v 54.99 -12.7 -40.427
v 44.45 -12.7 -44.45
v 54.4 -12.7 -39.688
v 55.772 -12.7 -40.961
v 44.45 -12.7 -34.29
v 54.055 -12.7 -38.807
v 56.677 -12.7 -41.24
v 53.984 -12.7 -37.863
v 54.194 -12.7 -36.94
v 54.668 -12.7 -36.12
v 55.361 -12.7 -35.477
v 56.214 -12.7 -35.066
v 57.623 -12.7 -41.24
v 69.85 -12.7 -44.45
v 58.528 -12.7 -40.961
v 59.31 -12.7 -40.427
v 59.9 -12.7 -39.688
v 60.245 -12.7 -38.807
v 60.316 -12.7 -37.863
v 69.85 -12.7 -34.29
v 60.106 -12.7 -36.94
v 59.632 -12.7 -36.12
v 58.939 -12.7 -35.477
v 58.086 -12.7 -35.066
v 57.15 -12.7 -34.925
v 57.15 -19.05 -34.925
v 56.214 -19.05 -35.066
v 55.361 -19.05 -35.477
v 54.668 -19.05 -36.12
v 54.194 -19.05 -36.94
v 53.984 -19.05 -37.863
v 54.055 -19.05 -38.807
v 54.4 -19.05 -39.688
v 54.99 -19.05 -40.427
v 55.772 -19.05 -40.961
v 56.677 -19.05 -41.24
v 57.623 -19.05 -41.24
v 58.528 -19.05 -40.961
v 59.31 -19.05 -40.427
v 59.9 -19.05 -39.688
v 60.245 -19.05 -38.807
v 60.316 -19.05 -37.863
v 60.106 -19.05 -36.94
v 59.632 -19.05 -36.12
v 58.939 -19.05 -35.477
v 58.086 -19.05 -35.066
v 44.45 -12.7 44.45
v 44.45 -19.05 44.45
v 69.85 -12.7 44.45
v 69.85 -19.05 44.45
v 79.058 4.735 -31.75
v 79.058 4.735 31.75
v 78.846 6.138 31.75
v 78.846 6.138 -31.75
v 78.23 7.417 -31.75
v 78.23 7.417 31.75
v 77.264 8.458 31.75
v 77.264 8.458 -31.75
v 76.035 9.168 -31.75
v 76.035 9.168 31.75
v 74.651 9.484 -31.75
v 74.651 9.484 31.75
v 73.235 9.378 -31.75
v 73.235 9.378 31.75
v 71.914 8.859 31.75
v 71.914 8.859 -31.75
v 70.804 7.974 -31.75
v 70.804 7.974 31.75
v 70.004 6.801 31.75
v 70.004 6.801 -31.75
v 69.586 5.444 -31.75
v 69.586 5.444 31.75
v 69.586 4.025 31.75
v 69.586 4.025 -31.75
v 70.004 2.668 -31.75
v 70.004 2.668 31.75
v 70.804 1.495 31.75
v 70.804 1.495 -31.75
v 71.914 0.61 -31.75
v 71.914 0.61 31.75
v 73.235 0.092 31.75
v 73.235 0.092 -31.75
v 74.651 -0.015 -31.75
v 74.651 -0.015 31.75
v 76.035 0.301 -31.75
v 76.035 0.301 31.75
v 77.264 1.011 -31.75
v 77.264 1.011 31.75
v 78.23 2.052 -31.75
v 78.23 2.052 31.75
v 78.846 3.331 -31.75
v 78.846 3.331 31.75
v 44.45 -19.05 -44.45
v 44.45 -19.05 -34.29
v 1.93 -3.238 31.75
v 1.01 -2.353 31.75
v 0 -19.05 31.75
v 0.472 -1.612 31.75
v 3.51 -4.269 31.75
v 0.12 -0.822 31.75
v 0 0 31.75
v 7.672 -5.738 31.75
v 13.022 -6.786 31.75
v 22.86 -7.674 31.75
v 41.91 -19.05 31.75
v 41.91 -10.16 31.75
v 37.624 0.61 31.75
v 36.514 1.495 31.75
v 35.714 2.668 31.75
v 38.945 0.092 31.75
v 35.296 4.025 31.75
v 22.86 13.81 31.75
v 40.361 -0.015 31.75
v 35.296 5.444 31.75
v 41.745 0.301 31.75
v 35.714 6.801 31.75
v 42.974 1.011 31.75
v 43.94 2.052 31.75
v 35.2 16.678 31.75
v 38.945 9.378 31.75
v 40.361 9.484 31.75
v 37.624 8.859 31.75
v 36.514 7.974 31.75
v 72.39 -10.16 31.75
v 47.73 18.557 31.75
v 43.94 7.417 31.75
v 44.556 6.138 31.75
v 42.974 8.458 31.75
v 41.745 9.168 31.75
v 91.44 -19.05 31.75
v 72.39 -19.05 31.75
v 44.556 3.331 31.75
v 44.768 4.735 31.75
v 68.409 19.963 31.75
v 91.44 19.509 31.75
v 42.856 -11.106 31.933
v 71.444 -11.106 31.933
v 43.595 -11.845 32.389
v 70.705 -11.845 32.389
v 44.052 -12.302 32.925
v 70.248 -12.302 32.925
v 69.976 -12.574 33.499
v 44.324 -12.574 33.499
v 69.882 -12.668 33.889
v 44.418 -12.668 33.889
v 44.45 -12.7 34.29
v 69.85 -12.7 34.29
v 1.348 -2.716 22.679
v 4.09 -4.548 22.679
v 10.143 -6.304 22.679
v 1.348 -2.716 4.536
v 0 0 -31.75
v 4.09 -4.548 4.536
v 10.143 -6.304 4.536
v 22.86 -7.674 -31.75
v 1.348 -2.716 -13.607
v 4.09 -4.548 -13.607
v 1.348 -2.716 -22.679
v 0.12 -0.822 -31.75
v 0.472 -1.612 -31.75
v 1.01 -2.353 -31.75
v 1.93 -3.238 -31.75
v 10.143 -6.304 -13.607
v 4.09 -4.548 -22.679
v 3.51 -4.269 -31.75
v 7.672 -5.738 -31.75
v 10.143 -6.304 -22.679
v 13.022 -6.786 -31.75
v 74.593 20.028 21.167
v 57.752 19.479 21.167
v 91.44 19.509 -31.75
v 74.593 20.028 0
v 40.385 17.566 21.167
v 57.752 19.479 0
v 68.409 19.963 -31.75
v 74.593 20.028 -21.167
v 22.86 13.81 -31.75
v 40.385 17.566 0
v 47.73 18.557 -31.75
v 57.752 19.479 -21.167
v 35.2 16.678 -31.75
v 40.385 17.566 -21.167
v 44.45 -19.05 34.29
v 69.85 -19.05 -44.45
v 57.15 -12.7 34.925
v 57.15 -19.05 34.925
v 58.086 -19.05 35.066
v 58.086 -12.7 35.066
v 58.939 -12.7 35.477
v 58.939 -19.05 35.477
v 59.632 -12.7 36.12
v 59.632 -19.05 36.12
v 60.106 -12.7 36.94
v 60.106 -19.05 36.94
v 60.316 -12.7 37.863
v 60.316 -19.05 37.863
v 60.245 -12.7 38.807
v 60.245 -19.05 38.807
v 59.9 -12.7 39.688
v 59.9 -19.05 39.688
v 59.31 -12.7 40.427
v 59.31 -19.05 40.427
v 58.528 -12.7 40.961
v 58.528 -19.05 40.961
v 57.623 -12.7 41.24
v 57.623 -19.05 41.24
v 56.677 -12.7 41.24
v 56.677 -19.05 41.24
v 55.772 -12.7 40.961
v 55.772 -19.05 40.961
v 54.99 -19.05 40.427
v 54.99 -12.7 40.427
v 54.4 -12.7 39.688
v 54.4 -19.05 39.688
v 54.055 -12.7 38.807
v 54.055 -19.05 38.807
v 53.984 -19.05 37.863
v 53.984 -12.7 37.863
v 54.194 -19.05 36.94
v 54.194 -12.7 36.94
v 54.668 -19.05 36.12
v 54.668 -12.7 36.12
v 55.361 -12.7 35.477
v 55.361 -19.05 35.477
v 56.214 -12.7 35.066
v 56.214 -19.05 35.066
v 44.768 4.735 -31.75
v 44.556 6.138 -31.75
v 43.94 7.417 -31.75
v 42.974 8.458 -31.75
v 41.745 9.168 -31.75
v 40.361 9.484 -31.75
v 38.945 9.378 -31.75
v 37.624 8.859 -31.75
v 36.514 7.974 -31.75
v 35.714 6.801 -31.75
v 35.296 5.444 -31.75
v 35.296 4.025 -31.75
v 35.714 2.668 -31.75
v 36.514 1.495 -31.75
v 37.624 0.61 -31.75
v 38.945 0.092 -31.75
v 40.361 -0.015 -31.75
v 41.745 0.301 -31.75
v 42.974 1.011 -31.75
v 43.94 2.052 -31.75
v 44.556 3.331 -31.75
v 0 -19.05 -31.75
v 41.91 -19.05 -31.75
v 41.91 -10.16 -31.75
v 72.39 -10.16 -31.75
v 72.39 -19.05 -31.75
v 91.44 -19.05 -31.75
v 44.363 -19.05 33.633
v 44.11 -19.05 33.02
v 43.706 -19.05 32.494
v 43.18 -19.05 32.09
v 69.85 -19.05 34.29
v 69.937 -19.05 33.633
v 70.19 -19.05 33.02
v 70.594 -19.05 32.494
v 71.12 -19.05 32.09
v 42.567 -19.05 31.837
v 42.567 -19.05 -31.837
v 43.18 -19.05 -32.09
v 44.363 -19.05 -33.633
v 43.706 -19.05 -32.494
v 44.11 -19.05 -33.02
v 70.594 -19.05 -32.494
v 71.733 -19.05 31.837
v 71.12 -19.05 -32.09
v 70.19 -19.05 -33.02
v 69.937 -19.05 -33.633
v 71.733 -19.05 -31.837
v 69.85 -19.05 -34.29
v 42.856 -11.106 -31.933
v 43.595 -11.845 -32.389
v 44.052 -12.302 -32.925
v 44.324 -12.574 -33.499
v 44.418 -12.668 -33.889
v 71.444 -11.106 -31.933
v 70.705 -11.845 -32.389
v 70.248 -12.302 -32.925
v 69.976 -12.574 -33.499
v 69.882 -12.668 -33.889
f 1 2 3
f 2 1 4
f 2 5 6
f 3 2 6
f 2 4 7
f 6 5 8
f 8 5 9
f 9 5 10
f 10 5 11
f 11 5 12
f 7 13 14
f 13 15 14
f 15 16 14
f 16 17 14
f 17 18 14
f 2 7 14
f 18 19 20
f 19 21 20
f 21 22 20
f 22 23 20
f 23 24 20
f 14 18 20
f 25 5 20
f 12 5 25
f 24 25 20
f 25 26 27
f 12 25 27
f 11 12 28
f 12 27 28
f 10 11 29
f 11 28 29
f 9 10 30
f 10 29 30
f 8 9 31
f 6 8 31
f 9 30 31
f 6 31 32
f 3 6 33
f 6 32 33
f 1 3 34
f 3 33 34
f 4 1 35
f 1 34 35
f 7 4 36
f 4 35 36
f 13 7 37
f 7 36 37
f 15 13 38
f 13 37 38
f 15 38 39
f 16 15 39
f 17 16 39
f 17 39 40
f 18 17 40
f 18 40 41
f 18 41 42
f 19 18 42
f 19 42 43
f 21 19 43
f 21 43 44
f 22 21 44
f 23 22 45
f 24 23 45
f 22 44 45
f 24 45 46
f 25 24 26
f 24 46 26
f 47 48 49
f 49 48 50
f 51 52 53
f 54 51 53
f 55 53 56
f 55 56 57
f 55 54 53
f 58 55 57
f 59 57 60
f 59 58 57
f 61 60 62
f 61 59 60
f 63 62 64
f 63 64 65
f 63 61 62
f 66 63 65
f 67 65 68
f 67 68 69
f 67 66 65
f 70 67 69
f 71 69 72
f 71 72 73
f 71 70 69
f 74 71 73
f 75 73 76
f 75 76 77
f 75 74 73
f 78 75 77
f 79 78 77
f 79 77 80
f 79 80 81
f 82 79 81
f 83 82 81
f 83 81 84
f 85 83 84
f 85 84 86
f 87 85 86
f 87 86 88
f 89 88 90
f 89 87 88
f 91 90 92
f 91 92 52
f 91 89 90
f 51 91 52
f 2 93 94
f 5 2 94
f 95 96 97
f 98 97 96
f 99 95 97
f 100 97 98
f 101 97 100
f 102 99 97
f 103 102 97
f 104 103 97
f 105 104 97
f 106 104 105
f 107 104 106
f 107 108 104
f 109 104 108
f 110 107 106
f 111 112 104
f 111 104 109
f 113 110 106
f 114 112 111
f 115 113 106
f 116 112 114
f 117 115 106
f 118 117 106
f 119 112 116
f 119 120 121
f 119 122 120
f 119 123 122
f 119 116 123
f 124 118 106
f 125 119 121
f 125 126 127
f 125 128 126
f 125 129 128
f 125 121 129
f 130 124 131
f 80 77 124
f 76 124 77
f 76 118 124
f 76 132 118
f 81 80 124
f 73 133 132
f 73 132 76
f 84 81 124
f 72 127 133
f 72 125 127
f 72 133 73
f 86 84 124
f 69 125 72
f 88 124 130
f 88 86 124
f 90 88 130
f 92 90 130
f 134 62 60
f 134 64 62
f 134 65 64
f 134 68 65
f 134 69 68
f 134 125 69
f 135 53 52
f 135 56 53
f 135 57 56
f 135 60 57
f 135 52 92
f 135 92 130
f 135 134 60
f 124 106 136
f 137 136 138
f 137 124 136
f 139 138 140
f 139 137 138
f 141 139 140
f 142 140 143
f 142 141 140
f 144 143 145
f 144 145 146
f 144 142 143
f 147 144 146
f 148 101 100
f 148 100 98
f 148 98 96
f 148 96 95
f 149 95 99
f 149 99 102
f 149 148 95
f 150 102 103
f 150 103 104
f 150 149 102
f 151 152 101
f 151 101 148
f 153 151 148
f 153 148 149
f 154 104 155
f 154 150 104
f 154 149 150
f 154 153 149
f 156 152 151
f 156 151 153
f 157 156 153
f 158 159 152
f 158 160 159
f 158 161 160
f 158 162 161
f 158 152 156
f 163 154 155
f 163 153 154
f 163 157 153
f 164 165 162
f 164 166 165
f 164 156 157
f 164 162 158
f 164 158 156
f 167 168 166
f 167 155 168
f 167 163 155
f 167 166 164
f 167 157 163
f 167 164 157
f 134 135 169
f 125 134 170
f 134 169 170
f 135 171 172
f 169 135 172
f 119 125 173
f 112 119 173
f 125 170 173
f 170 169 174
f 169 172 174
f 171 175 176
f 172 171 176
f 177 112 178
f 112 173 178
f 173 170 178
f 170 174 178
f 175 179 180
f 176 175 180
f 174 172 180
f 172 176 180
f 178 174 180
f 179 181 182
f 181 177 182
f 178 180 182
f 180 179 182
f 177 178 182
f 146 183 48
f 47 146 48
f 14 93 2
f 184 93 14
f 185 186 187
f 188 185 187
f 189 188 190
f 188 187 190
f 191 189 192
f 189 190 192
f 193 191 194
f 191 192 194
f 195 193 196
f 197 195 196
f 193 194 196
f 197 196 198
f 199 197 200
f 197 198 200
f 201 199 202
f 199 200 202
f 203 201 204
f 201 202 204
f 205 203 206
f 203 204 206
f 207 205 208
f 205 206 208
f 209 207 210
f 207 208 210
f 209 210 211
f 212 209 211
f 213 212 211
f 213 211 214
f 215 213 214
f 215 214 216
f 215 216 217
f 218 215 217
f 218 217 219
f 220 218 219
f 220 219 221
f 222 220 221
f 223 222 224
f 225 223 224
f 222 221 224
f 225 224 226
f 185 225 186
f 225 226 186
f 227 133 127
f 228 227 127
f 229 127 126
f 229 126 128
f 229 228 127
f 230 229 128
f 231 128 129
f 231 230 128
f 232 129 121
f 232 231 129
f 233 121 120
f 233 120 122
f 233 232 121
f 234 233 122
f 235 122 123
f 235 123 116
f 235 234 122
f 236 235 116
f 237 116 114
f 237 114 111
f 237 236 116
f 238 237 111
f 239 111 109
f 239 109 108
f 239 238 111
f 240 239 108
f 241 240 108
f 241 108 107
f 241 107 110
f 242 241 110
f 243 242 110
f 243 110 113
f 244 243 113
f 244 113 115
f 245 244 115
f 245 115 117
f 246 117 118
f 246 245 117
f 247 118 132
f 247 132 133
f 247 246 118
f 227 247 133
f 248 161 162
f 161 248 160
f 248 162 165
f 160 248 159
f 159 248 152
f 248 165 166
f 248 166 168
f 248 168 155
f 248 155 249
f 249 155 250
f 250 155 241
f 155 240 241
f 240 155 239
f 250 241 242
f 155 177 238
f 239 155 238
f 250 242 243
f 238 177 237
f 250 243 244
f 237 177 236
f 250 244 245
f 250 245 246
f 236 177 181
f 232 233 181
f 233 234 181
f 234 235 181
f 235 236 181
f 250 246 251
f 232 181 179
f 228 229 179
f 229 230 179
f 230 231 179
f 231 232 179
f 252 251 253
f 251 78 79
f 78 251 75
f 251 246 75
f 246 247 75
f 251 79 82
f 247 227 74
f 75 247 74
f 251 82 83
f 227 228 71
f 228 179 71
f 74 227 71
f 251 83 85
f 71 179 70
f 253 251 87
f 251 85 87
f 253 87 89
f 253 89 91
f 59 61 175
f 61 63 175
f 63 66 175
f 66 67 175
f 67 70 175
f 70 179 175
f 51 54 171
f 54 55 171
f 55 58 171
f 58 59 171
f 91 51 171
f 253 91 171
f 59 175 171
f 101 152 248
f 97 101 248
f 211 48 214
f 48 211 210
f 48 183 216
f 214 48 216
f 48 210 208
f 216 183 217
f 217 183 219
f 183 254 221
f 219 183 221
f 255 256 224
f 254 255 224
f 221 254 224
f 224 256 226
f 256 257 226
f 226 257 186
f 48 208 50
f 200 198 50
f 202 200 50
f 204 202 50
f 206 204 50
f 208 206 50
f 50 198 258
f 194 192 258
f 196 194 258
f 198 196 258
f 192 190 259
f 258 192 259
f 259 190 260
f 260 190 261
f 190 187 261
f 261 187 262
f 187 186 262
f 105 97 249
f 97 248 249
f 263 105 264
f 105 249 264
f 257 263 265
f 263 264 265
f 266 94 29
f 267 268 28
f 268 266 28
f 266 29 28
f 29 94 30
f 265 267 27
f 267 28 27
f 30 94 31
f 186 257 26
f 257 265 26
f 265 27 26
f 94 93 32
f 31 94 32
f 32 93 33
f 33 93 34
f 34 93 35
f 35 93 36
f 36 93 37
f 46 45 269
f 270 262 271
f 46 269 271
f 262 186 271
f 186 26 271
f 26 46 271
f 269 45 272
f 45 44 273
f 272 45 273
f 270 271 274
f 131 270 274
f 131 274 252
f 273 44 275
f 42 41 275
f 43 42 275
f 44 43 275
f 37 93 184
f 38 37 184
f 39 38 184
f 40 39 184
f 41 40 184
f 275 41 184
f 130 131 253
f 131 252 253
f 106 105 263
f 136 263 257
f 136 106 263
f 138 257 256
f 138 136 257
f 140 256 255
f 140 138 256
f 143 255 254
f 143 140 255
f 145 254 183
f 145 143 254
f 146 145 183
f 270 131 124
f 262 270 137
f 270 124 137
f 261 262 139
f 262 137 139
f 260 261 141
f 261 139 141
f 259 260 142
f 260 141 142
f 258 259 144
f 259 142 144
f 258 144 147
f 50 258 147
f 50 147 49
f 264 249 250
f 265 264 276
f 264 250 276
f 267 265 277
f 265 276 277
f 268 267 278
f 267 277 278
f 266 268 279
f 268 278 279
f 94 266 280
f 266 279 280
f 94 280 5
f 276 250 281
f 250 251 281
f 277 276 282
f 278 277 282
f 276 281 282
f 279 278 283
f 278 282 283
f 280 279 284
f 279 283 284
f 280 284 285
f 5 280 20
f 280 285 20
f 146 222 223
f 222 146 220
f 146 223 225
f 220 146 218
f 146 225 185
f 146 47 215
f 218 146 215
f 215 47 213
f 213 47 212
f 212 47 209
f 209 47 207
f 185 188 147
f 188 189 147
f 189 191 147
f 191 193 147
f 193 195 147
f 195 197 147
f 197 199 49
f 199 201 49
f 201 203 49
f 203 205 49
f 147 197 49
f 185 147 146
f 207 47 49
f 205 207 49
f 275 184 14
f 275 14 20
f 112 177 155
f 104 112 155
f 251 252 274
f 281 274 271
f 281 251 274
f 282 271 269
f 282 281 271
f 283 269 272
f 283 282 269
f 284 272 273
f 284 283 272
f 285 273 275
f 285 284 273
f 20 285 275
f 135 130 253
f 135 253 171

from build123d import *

# Parameters (mm, degrees)
BOSS_EXTRUDE2_DEPTH      = 31.75
BOSS_EXTRUDE2_DEPTH_BACK = 31.75
SKETCH6_R                = 4.7625
SKETCH7_W                = 25.4
SKETCH7_H                = 12.7
SKETCH7_R                = 3.175
BOSS_EXTRUDE3_DEPTH      = 6.35
FILLET2_R                = 2.54


with BuildPart() as part:
    # Sketch6 → Boss-Extrude2 (new, two sides: drawn at the far end of the back side and taken through both)
    with BuildSketch(Plane.XY.offset(-BOSS_EXTRUDE2_DEPTH_BACK)):
        with BuildLine():
            Line((0, 0), (0, -19.05))
            Line((0, -19.05), (91.44, -19.05))
            Line((91.44, -19.05), (91.44, 19.508873689))
            add(Edge.make_bspline(
                [(91.44, 19.508873689), (84.035620806, 19.934056268), (72.792017375, 20.223197155), (57.72640102, 19.576586177), (46.241137994, 18.487194162), (34.713862172, 16.738987134), (26.950784486, 14.94277721), (23.006436851, 13.850652949), (22.86, 13.80984362)],
                knots=[0.299041321, 0.299041321, 0.299041321, 0.299041321, 0.346600594, 0.371102737, 0.395726297, 0.420570145, 0.445825119, 0.446799337, 0.446799337, 0.446799337, 0.446799337], degree=3))
            Line((22.86, 13.80984362), (22.86, -7.674303273))
            add(Edge.make_bspline(
                [(0, 0), (0, -0.17867716), (0.134938936, -1.688448649), (2.416021962, -3.935922156), (6.457030189, -5.50998662), (11.289417386, -6.62752917), (17.013896112, -7.281283102), (20.870897646, -7.562814069), (22.817971884, -7.671962522), (22.86, -7.674303273)],
                knots=[0.505625693, 0.505625693, 0.505625693, 0.505625693, 0.506863029, 0.51614777, 0.522766003, 0.535269014, 0.547551134, 0.559786371, 0.560056294, 0.560056294, 0.560056294, 0.560056294], degree=3))
        make_face()
        with Locations((40.005, 4.734594188)):
            Circle(SKETCH6_R, mode=Mode.SUBTRACT)
        with Locations((74.295, 4.734594188)):
            Circle(SKETCH6_R, mode=Mode.SUBTRACT)
    extrude(amount=BOSS_EXTRUDE2_DEPTH + BOSS_EXTRUDE2_DEPTH_BACK)

    # Sketch7 → Boss-Extrude3 (add)
    # profile 1 of 2: a face of its own
    with BuildSketch(Plane.XZ.offset(19.05)):
        with Locations((57.15, 38.1)):
            Rectangle(SKETCH7_W, SKETCH7_H)
        with Locations((57.15, 38.1)):
            Circle(SKETCH7_R, mode=Mode.SUBTRACT)
    # profile 2 of 2: a face of its own
    with BuildSketch(Plane.XZ.offset(19.05)):
        with Locations((57.15, -38.1)):
            Rectangle(SKETCH7_W, SKETCH7_H)
        with Locations((57.15, -38.1)):
            Circle(SKETCH7_R, mode=Mode.SUBTRACT)
    extrude(amount=-BOSS_EXTRUDE3_DEPTH)

    # Fillet2
    fillet2_edges = [part.edges().sort_by_distance(p)[0] for p in [
        (57.15, -12.7, 31.75),
        (44.45, -15.875, 31.75),
        (69.85, -15.875, 31.75),
        (57.15, -12.7, -31.75),
        (69.85, -15.875, -31.75),
        (44.45, -15.875, -31.75),
    ]]
    fillet(fillet2_edges, radius=FILLET2_R)


solid = part.part
